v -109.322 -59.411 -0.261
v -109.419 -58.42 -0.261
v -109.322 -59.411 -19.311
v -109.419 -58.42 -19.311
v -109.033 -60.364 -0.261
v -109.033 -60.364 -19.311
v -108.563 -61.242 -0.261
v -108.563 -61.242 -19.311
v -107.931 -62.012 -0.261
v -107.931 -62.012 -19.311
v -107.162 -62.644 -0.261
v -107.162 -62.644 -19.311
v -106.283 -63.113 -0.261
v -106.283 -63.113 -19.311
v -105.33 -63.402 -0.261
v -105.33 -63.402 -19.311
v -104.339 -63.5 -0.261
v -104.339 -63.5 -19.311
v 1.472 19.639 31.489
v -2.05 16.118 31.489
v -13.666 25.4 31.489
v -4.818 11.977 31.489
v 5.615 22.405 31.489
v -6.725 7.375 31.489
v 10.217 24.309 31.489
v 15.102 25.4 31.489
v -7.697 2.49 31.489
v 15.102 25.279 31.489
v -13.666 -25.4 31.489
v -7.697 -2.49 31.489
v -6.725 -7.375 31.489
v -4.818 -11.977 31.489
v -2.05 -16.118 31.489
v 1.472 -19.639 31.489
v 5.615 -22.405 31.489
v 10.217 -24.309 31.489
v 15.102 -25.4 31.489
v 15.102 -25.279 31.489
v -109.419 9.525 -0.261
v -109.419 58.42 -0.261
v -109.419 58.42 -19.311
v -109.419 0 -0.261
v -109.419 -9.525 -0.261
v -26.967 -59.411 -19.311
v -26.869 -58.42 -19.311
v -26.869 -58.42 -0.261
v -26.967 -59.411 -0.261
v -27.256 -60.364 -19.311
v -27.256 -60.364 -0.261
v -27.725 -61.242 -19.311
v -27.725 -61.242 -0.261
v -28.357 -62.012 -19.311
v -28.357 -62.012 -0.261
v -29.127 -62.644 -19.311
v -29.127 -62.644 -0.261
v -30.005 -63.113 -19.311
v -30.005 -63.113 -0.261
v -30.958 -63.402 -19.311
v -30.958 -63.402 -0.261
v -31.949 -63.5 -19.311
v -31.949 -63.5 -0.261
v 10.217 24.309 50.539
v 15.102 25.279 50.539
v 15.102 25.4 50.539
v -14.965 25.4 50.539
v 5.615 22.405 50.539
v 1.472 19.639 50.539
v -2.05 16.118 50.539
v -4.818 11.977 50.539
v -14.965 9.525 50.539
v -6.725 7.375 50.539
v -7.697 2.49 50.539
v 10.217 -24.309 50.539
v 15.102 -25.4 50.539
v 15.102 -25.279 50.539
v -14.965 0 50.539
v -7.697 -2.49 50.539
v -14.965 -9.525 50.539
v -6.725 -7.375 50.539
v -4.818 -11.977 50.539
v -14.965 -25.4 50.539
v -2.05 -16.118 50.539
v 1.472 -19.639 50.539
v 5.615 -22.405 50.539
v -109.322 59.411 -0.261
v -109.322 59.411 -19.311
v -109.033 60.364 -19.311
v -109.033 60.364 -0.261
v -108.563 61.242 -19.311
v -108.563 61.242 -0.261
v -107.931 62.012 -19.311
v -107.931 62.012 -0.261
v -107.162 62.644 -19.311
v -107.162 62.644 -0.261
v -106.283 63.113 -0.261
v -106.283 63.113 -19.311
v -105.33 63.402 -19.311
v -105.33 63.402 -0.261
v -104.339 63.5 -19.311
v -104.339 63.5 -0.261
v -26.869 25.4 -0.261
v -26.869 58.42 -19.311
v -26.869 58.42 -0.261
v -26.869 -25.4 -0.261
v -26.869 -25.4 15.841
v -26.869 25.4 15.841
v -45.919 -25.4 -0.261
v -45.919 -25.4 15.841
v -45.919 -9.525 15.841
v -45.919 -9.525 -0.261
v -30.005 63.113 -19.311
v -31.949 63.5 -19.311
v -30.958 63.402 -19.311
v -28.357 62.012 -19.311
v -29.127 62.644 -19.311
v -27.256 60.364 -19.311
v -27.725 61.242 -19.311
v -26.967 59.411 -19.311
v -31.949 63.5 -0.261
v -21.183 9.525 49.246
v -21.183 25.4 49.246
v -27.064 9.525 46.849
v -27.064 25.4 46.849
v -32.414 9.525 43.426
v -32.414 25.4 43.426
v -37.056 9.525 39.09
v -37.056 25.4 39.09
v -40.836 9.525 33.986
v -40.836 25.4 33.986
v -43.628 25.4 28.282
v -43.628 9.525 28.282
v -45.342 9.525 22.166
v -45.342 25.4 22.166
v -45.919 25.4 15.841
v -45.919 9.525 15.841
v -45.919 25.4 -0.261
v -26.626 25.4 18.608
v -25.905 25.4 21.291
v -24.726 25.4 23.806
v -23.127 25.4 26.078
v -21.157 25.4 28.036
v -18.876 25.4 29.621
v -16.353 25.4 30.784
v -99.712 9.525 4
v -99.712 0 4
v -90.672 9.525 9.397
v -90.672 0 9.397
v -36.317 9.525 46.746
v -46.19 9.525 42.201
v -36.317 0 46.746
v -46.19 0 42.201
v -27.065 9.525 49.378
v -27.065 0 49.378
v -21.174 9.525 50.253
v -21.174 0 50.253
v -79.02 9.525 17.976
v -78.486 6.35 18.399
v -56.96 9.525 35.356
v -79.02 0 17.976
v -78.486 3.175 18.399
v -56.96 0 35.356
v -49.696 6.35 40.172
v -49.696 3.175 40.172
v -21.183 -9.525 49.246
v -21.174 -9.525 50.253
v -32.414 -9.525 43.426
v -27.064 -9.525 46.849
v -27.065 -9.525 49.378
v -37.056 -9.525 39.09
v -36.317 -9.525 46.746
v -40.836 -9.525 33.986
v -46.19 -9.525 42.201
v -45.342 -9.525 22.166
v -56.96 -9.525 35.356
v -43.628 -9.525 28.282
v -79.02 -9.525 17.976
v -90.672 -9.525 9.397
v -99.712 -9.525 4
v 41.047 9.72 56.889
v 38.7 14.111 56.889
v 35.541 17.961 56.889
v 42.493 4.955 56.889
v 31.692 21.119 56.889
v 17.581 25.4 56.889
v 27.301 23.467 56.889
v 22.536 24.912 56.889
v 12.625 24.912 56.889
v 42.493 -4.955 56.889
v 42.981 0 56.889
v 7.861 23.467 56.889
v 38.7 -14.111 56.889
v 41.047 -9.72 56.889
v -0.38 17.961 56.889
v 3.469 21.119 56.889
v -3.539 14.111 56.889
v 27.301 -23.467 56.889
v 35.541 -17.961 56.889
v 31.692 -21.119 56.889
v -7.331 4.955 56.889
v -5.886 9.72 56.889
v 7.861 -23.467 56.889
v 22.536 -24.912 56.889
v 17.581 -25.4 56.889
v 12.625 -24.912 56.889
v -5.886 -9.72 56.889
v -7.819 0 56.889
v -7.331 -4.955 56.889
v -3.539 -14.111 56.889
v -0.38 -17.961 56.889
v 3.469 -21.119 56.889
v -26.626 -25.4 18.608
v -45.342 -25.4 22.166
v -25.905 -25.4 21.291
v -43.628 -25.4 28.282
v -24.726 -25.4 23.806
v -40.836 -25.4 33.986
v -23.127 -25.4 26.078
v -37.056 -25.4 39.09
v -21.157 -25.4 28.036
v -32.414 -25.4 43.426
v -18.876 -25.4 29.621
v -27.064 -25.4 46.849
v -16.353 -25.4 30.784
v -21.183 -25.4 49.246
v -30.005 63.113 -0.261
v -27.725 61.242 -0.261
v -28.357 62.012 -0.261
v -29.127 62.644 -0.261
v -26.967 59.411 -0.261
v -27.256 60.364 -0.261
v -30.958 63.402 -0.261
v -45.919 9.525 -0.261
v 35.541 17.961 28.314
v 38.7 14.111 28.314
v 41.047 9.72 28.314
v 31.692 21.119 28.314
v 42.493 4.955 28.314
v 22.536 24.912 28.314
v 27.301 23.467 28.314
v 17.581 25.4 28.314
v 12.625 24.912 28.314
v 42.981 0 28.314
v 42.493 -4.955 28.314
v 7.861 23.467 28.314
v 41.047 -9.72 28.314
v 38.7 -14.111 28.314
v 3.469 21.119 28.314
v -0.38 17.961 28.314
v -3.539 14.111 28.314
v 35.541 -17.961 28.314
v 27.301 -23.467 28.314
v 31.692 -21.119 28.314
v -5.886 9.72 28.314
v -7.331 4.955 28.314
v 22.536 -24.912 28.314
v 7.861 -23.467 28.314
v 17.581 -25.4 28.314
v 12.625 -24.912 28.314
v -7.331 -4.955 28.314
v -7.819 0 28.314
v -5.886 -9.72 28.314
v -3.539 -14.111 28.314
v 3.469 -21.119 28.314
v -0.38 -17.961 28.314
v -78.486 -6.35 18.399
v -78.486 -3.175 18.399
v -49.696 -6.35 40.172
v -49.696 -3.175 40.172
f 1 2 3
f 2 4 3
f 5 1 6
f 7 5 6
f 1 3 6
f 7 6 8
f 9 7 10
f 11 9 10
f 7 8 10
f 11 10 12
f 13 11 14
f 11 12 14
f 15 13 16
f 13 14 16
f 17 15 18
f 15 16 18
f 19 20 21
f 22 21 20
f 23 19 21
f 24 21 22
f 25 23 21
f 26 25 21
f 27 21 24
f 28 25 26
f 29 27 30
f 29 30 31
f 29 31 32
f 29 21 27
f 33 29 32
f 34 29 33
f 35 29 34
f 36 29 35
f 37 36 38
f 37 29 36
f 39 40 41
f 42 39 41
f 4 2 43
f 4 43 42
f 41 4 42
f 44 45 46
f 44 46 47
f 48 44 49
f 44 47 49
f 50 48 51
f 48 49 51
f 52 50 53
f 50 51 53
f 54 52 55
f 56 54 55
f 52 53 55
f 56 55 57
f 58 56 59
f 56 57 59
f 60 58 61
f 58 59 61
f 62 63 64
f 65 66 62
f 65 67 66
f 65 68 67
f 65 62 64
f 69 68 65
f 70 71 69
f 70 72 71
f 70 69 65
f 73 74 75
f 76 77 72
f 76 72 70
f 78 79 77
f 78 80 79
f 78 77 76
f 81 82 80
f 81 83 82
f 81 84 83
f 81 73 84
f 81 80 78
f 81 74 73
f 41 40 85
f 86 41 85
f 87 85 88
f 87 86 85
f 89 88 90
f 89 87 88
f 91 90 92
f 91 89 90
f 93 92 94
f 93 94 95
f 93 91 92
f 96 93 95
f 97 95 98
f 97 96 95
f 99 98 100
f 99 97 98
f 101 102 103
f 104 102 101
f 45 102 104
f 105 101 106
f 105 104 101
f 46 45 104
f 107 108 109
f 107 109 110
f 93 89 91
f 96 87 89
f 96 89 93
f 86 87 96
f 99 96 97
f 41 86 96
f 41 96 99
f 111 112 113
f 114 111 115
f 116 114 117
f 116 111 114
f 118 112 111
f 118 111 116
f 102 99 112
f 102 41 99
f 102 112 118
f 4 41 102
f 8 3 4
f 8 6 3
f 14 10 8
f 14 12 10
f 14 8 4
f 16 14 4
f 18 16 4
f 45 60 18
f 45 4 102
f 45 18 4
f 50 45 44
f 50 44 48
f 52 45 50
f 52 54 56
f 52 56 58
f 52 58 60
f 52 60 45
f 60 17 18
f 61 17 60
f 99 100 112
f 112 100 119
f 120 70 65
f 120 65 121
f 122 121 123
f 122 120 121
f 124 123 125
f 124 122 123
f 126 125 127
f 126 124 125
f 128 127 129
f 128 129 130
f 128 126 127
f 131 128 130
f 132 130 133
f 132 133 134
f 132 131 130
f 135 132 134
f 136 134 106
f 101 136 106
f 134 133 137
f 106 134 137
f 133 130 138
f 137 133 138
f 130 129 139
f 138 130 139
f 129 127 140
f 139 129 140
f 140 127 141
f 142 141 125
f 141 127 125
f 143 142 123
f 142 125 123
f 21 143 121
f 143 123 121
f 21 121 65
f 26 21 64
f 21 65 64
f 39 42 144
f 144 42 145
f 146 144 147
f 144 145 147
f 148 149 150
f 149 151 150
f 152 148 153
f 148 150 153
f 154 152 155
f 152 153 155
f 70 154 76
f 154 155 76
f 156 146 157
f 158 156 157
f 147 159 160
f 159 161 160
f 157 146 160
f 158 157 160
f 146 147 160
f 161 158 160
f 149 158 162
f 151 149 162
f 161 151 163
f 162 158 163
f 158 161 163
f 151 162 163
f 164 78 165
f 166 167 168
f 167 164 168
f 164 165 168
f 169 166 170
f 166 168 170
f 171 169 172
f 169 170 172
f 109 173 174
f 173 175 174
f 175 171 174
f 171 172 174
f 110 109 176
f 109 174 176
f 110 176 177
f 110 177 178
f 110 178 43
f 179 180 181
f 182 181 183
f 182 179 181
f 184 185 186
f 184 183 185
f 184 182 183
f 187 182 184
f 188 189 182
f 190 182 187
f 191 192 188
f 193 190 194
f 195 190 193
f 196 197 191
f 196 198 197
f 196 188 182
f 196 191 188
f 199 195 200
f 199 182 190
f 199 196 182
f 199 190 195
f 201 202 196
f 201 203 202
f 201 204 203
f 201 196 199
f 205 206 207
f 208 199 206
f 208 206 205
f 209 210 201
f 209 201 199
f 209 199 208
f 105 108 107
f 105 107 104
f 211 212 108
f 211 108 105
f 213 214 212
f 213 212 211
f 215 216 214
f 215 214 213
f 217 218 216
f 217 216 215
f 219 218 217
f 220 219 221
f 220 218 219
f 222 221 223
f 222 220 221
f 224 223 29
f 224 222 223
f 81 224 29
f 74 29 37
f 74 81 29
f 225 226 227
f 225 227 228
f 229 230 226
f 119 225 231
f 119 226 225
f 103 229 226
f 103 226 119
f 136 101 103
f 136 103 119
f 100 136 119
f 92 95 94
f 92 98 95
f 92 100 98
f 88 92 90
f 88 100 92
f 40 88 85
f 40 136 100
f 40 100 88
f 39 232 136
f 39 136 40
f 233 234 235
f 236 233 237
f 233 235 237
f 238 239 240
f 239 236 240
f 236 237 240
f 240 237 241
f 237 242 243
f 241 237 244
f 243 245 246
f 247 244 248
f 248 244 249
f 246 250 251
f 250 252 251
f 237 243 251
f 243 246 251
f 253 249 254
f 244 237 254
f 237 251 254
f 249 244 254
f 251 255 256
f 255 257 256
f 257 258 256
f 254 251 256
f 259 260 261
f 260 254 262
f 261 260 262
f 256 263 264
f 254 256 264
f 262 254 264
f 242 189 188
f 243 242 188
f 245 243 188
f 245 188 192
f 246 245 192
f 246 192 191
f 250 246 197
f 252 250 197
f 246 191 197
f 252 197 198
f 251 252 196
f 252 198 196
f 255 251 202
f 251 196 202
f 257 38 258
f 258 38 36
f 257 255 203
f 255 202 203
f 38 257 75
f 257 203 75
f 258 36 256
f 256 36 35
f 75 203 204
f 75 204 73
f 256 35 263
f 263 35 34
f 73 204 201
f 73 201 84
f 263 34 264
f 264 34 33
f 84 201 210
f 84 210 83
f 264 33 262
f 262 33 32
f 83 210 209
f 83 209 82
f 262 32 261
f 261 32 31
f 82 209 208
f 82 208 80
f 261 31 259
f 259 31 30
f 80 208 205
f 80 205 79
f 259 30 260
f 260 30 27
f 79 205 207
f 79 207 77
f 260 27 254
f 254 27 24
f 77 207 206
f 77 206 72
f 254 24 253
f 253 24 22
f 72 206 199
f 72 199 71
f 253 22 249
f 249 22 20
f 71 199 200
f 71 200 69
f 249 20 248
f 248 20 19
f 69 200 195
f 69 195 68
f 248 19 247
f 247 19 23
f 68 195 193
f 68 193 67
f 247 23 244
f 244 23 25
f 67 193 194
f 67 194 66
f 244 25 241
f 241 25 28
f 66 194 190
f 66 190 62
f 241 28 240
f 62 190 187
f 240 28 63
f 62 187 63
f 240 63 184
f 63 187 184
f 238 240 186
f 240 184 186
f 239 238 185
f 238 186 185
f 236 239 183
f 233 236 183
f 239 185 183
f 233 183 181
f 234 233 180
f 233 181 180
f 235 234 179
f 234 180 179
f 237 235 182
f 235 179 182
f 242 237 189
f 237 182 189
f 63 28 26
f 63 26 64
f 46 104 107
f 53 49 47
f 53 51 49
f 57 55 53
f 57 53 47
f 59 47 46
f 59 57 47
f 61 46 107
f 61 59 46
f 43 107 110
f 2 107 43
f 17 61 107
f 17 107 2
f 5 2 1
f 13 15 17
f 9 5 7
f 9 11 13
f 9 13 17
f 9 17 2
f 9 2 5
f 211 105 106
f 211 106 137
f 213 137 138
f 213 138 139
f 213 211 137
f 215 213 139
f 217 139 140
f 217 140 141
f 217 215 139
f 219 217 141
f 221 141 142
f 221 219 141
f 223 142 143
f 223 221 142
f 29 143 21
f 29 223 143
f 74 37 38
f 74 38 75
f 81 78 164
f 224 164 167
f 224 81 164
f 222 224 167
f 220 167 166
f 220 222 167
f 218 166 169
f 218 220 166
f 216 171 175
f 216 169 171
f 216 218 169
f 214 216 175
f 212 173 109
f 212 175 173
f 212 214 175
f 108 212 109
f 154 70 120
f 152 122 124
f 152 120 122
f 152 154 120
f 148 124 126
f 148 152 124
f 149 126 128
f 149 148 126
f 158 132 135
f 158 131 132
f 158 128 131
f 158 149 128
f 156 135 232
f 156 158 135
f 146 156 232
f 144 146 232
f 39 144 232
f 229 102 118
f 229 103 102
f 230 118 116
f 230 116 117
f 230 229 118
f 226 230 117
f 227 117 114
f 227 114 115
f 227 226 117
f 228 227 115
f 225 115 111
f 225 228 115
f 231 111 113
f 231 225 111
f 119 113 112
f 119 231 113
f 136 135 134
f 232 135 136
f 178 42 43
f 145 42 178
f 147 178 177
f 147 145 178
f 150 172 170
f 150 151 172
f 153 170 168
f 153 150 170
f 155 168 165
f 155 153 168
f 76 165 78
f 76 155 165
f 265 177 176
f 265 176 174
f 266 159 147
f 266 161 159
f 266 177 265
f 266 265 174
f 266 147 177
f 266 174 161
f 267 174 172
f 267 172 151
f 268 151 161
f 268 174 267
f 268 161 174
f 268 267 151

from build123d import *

# Parameters (mm, degrees)
F1_DEPTH = 63.5
F0_W     = 22.921771
F0_H     = 19.05
F2_DEPTH = 25.4
F3_DEPTH = 9.525
F0_W_2   = 25.4
F0_H_2   = 28.575
F5_R     = 5.08


with BuildPart() as f1:
    # F0 (on Front) → F1 (new body, symmetric)
    with BuildSketch(Plane.XZ):
        Polygon((-109.419321, -19.310768), (-26.869321, -19.310768), (-26.869321, -0.260768), (-45.919321, -0.260768), (-109.419321, -0.260768), align=None)
    extrude(amount=F1_DEPTH, both=True)

    # F0 (on Front) → F2 (join, symmetric)
    with BuildSketch(Plane.XZ):
        with BuildLine():
            Line((-45.919321, -0.260768), (-26.869321, -0.260768))
            Line((-26.869321, -0.260768), (-26.869321, 15.84063))
            ThreePointArc((-26.869321, 15.84063), (-23.12745, 26.077956), (-13.665816, 31.489232))
            Line((-13.665816, 31.489232), (-7.819321, 31.489232))
            Line((-7.819321, 31.489232), (-7.819321, 50.539232))
            Line((-7.819321, 50.539232), (-14.964541, 50.539232))
            ThreePointArc((-14.964541, 50.539232), (-37.055936, 39.090315), (-45.919321, 15.84063))
            Line((-45.919321, 15.84063), (-45.919321, -0.260768))
        make_face()
        with Locations((3.641564, 41.014232)):
            Rectangle(F0_W, F0_H)
    extrude(amount=F2_DEPTH, both=True)

    # F0 (on Front) → F3 (join, symmetric)
    with BuildSketch(Plane.XZ):
        with BuildLine():
            add(Edge.make_bspline(
                [(-109.419321, -0.260768), (-74.719019, 12.0015), (-55.361759, 50.716016), (-14.964541, 50.539232)],
                knots=[0, 0, 0, 0, 107.248988, 107.248988, 107.248988, 107.248988], degree=3))
            Line((-109.419321, -0.260768), (-45.919321, -0.260768))
            Line((-45.919321, -0.260768), (-45.919321, 15.84063))
            ThreePointArc((-45.919321, 15.84063), (-37.055936, 39.090315), (-14.964541, 50.539232))
        make_face()
    extrude(amount=F3_DEPTH, both=True)

    # F0 (on Front) → F4 (revolve)
    with BuildSketch(Plane.XZ):
        with Locations((30.280679, 42.601732)):
            Rectangle(F0_W_2, F0_H_2)
    revolve(axis=Axis((17.580679, 0, 42.601732), (0, 0, -1)))

    # F5
    f5_edges = [f1.edges().sort_by_distance(p)[0] for p in [
        (-109.419321, -63.5, -9.785768),
        (-109.419321, 63.5, -9.785768),
        (-26.869321, -63.5, -9.785768),
        (-26.869321, 63.5, -9.785768),
    ]]
    fillet(f5_edges, radius=F5_R)


solid = f1.part
